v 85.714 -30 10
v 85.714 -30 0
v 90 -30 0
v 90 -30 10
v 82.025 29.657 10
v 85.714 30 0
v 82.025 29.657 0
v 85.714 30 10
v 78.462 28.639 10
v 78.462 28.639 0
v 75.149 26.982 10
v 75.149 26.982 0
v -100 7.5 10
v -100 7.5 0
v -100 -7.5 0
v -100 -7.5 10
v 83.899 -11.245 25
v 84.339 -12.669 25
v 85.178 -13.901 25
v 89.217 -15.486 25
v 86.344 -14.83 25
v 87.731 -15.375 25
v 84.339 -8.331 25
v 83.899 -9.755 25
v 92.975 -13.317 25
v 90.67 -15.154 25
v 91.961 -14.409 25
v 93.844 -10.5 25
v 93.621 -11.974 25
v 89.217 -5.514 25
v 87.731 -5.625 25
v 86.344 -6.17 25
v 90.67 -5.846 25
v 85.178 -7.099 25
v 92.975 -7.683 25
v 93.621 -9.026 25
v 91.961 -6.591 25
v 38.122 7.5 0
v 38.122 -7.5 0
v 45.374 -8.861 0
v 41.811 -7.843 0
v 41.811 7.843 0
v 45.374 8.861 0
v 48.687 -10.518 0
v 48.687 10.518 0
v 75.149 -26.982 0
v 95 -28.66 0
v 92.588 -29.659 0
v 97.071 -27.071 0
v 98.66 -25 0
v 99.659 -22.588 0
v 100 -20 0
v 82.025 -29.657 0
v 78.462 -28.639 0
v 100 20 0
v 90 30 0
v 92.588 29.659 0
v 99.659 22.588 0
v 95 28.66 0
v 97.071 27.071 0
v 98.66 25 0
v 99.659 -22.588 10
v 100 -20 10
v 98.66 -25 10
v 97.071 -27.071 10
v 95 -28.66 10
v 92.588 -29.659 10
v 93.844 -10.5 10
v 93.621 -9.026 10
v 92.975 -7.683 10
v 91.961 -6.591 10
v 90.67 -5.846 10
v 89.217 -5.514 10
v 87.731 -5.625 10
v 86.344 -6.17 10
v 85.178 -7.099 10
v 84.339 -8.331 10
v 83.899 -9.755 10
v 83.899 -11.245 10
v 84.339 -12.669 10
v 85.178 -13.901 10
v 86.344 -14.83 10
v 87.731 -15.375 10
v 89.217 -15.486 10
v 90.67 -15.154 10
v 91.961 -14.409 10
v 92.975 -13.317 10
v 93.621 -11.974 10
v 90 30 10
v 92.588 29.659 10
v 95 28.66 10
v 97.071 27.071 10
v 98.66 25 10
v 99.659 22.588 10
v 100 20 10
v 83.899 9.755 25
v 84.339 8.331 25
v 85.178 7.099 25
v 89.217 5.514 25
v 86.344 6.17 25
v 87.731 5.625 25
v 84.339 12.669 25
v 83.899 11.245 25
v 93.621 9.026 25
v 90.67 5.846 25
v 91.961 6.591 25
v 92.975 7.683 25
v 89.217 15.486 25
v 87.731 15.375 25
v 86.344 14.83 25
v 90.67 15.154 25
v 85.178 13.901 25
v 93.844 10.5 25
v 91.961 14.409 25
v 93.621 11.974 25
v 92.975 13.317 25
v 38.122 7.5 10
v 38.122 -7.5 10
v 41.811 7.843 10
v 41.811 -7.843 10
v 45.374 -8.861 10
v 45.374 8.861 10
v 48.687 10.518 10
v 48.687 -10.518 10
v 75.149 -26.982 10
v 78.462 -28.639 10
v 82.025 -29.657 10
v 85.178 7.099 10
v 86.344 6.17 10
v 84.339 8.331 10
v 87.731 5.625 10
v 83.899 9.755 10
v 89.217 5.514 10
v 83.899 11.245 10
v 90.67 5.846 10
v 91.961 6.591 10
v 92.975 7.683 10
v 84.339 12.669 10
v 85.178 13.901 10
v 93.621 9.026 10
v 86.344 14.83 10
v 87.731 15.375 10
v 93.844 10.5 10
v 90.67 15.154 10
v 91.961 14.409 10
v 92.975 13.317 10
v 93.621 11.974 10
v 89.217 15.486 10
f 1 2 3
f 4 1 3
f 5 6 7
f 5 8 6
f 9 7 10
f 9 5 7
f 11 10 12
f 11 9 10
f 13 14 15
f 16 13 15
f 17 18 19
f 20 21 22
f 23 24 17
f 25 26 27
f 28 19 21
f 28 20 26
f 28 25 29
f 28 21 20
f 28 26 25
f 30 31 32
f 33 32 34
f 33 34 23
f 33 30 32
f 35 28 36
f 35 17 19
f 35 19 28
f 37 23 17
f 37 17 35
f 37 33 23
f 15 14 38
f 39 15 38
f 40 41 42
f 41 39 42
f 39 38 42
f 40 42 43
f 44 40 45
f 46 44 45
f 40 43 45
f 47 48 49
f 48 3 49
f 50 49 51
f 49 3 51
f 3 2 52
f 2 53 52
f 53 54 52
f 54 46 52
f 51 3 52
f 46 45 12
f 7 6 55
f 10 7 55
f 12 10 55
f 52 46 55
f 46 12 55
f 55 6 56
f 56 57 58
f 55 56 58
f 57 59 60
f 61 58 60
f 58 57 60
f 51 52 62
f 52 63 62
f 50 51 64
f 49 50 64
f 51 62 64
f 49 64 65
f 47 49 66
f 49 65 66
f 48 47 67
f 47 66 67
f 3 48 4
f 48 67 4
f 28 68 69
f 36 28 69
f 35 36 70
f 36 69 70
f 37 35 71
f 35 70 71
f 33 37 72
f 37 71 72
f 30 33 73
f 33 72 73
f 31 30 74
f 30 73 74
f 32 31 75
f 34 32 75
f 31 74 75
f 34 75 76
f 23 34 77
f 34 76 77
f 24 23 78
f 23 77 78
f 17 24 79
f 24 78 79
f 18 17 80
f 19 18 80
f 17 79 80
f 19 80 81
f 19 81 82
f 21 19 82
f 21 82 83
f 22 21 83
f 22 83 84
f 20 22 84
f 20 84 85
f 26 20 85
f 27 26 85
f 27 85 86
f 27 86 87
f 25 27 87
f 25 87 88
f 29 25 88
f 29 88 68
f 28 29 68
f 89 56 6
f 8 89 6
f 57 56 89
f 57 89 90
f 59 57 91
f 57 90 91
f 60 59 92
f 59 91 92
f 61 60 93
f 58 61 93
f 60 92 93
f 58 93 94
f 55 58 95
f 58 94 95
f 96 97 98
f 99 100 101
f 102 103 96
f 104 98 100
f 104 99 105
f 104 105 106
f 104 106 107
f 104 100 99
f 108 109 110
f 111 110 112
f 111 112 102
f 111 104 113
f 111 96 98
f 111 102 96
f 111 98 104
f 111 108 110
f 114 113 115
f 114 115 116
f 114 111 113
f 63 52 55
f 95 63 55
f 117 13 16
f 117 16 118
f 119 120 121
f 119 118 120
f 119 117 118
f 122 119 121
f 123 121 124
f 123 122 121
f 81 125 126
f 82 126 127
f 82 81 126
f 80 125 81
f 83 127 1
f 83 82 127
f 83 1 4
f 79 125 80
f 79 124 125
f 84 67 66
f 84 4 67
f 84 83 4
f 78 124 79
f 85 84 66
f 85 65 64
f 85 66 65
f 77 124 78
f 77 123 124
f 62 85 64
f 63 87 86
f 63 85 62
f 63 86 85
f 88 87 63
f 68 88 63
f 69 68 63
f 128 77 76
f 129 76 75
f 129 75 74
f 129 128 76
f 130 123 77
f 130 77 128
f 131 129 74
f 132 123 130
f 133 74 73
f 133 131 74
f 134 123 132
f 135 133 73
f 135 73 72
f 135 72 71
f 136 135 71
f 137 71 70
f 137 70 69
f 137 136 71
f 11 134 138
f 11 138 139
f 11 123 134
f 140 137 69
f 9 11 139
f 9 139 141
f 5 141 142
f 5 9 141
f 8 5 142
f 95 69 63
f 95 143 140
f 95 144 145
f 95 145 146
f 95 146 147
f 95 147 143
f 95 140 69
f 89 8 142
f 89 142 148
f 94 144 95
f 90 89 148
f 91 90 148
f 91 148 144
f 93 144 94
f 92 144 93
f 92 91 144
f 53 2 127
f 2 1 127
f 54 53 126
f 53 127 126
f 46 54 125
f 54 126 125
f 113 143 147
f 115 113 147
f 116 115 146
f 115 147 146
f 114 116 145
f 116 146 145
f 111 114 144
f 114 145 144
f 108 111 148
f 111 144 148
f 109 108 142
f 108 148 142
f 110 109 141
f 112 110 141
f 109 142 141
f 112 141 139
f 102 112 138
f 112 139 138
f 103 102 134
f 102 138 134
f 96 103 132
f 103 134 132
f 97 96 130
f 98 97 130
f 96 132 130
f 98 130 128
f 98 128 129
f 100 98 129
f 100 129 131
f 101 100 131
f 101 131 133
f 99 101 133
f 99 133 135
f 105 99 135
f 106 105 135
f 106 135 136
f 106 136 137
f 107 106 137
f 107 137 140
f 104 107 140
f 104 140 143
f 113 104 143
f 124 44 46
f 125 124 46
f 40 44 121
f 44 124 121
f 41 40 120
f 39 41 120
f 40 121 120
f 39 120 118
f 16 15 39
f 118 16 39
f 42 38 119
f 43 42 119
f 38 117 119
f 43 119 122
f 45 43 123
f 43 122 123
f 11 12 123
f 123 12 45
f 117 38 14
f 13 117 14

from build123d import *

# Parameters (mm, degrees)
F0_R     = 5
F1_DEPTH = 10
F2_DEPTH = 25
F3_DEPTH = 25
F4_R     = 10
F5_R     = 20


with BuildPart() as f1:
    # F0 (on Top) → F1 (new body)
    with BuildSketch(Plane.XY):
        Polygon((80, 30), (43.835908, 7.5), (-100, 7.5), (-100, -7.5), (43.835908, -7.5), (80, -30), (100, -30), (100, 0), (100, 30), align=None)
        with Locations((88.843614, -10.5)):
            Circle(F0_R, mode=Mode.SUBTRACT)
        with Locations((88.843614, 10.5)):
            Circle(F0_R, mode=Mode.SUBTRACT)
        with Locations((88.843614, -10.5)):
            Circle(F0_R)
        with Locations((88.843614, 10.5)):
            Circle(F0_R)
    extrude(amount=F1_DEPTH)

    # F0 (on Top) → F2 (join)
    with BuildSketch(Plane.XY):
        with Locations((88.843614, -10.5)):
            Circle(F0_R)
    extrude(amount=F2_DEPTH)

    # F0 (on Top) → F3 (join)
    with BuildSketch(Plane.XY):
        with Locations((88.843614, 10.5)):
            Circle(F0_R)
    extrude(amount=F3_DEPTH)

    # F4
    f4_edges = [f1.edges().sort_by_distance(p)[0] for p in [
        (100, 30, 5),
        (100, -30, 5),
    ]]
    fillet(f4_edges, radius=F4_R)

    # F5
    f5_edges = [f1.edges().sort_by_distance(p)[0] for p in [
        (80, -30, 5),
        (80, 30, 5),
        (43.835908, 7.5, 5),
        (43.835908, -7.5, 5),
    ]]
    fillet(f5_edges, radius=F5_R)


solid = f1.part
